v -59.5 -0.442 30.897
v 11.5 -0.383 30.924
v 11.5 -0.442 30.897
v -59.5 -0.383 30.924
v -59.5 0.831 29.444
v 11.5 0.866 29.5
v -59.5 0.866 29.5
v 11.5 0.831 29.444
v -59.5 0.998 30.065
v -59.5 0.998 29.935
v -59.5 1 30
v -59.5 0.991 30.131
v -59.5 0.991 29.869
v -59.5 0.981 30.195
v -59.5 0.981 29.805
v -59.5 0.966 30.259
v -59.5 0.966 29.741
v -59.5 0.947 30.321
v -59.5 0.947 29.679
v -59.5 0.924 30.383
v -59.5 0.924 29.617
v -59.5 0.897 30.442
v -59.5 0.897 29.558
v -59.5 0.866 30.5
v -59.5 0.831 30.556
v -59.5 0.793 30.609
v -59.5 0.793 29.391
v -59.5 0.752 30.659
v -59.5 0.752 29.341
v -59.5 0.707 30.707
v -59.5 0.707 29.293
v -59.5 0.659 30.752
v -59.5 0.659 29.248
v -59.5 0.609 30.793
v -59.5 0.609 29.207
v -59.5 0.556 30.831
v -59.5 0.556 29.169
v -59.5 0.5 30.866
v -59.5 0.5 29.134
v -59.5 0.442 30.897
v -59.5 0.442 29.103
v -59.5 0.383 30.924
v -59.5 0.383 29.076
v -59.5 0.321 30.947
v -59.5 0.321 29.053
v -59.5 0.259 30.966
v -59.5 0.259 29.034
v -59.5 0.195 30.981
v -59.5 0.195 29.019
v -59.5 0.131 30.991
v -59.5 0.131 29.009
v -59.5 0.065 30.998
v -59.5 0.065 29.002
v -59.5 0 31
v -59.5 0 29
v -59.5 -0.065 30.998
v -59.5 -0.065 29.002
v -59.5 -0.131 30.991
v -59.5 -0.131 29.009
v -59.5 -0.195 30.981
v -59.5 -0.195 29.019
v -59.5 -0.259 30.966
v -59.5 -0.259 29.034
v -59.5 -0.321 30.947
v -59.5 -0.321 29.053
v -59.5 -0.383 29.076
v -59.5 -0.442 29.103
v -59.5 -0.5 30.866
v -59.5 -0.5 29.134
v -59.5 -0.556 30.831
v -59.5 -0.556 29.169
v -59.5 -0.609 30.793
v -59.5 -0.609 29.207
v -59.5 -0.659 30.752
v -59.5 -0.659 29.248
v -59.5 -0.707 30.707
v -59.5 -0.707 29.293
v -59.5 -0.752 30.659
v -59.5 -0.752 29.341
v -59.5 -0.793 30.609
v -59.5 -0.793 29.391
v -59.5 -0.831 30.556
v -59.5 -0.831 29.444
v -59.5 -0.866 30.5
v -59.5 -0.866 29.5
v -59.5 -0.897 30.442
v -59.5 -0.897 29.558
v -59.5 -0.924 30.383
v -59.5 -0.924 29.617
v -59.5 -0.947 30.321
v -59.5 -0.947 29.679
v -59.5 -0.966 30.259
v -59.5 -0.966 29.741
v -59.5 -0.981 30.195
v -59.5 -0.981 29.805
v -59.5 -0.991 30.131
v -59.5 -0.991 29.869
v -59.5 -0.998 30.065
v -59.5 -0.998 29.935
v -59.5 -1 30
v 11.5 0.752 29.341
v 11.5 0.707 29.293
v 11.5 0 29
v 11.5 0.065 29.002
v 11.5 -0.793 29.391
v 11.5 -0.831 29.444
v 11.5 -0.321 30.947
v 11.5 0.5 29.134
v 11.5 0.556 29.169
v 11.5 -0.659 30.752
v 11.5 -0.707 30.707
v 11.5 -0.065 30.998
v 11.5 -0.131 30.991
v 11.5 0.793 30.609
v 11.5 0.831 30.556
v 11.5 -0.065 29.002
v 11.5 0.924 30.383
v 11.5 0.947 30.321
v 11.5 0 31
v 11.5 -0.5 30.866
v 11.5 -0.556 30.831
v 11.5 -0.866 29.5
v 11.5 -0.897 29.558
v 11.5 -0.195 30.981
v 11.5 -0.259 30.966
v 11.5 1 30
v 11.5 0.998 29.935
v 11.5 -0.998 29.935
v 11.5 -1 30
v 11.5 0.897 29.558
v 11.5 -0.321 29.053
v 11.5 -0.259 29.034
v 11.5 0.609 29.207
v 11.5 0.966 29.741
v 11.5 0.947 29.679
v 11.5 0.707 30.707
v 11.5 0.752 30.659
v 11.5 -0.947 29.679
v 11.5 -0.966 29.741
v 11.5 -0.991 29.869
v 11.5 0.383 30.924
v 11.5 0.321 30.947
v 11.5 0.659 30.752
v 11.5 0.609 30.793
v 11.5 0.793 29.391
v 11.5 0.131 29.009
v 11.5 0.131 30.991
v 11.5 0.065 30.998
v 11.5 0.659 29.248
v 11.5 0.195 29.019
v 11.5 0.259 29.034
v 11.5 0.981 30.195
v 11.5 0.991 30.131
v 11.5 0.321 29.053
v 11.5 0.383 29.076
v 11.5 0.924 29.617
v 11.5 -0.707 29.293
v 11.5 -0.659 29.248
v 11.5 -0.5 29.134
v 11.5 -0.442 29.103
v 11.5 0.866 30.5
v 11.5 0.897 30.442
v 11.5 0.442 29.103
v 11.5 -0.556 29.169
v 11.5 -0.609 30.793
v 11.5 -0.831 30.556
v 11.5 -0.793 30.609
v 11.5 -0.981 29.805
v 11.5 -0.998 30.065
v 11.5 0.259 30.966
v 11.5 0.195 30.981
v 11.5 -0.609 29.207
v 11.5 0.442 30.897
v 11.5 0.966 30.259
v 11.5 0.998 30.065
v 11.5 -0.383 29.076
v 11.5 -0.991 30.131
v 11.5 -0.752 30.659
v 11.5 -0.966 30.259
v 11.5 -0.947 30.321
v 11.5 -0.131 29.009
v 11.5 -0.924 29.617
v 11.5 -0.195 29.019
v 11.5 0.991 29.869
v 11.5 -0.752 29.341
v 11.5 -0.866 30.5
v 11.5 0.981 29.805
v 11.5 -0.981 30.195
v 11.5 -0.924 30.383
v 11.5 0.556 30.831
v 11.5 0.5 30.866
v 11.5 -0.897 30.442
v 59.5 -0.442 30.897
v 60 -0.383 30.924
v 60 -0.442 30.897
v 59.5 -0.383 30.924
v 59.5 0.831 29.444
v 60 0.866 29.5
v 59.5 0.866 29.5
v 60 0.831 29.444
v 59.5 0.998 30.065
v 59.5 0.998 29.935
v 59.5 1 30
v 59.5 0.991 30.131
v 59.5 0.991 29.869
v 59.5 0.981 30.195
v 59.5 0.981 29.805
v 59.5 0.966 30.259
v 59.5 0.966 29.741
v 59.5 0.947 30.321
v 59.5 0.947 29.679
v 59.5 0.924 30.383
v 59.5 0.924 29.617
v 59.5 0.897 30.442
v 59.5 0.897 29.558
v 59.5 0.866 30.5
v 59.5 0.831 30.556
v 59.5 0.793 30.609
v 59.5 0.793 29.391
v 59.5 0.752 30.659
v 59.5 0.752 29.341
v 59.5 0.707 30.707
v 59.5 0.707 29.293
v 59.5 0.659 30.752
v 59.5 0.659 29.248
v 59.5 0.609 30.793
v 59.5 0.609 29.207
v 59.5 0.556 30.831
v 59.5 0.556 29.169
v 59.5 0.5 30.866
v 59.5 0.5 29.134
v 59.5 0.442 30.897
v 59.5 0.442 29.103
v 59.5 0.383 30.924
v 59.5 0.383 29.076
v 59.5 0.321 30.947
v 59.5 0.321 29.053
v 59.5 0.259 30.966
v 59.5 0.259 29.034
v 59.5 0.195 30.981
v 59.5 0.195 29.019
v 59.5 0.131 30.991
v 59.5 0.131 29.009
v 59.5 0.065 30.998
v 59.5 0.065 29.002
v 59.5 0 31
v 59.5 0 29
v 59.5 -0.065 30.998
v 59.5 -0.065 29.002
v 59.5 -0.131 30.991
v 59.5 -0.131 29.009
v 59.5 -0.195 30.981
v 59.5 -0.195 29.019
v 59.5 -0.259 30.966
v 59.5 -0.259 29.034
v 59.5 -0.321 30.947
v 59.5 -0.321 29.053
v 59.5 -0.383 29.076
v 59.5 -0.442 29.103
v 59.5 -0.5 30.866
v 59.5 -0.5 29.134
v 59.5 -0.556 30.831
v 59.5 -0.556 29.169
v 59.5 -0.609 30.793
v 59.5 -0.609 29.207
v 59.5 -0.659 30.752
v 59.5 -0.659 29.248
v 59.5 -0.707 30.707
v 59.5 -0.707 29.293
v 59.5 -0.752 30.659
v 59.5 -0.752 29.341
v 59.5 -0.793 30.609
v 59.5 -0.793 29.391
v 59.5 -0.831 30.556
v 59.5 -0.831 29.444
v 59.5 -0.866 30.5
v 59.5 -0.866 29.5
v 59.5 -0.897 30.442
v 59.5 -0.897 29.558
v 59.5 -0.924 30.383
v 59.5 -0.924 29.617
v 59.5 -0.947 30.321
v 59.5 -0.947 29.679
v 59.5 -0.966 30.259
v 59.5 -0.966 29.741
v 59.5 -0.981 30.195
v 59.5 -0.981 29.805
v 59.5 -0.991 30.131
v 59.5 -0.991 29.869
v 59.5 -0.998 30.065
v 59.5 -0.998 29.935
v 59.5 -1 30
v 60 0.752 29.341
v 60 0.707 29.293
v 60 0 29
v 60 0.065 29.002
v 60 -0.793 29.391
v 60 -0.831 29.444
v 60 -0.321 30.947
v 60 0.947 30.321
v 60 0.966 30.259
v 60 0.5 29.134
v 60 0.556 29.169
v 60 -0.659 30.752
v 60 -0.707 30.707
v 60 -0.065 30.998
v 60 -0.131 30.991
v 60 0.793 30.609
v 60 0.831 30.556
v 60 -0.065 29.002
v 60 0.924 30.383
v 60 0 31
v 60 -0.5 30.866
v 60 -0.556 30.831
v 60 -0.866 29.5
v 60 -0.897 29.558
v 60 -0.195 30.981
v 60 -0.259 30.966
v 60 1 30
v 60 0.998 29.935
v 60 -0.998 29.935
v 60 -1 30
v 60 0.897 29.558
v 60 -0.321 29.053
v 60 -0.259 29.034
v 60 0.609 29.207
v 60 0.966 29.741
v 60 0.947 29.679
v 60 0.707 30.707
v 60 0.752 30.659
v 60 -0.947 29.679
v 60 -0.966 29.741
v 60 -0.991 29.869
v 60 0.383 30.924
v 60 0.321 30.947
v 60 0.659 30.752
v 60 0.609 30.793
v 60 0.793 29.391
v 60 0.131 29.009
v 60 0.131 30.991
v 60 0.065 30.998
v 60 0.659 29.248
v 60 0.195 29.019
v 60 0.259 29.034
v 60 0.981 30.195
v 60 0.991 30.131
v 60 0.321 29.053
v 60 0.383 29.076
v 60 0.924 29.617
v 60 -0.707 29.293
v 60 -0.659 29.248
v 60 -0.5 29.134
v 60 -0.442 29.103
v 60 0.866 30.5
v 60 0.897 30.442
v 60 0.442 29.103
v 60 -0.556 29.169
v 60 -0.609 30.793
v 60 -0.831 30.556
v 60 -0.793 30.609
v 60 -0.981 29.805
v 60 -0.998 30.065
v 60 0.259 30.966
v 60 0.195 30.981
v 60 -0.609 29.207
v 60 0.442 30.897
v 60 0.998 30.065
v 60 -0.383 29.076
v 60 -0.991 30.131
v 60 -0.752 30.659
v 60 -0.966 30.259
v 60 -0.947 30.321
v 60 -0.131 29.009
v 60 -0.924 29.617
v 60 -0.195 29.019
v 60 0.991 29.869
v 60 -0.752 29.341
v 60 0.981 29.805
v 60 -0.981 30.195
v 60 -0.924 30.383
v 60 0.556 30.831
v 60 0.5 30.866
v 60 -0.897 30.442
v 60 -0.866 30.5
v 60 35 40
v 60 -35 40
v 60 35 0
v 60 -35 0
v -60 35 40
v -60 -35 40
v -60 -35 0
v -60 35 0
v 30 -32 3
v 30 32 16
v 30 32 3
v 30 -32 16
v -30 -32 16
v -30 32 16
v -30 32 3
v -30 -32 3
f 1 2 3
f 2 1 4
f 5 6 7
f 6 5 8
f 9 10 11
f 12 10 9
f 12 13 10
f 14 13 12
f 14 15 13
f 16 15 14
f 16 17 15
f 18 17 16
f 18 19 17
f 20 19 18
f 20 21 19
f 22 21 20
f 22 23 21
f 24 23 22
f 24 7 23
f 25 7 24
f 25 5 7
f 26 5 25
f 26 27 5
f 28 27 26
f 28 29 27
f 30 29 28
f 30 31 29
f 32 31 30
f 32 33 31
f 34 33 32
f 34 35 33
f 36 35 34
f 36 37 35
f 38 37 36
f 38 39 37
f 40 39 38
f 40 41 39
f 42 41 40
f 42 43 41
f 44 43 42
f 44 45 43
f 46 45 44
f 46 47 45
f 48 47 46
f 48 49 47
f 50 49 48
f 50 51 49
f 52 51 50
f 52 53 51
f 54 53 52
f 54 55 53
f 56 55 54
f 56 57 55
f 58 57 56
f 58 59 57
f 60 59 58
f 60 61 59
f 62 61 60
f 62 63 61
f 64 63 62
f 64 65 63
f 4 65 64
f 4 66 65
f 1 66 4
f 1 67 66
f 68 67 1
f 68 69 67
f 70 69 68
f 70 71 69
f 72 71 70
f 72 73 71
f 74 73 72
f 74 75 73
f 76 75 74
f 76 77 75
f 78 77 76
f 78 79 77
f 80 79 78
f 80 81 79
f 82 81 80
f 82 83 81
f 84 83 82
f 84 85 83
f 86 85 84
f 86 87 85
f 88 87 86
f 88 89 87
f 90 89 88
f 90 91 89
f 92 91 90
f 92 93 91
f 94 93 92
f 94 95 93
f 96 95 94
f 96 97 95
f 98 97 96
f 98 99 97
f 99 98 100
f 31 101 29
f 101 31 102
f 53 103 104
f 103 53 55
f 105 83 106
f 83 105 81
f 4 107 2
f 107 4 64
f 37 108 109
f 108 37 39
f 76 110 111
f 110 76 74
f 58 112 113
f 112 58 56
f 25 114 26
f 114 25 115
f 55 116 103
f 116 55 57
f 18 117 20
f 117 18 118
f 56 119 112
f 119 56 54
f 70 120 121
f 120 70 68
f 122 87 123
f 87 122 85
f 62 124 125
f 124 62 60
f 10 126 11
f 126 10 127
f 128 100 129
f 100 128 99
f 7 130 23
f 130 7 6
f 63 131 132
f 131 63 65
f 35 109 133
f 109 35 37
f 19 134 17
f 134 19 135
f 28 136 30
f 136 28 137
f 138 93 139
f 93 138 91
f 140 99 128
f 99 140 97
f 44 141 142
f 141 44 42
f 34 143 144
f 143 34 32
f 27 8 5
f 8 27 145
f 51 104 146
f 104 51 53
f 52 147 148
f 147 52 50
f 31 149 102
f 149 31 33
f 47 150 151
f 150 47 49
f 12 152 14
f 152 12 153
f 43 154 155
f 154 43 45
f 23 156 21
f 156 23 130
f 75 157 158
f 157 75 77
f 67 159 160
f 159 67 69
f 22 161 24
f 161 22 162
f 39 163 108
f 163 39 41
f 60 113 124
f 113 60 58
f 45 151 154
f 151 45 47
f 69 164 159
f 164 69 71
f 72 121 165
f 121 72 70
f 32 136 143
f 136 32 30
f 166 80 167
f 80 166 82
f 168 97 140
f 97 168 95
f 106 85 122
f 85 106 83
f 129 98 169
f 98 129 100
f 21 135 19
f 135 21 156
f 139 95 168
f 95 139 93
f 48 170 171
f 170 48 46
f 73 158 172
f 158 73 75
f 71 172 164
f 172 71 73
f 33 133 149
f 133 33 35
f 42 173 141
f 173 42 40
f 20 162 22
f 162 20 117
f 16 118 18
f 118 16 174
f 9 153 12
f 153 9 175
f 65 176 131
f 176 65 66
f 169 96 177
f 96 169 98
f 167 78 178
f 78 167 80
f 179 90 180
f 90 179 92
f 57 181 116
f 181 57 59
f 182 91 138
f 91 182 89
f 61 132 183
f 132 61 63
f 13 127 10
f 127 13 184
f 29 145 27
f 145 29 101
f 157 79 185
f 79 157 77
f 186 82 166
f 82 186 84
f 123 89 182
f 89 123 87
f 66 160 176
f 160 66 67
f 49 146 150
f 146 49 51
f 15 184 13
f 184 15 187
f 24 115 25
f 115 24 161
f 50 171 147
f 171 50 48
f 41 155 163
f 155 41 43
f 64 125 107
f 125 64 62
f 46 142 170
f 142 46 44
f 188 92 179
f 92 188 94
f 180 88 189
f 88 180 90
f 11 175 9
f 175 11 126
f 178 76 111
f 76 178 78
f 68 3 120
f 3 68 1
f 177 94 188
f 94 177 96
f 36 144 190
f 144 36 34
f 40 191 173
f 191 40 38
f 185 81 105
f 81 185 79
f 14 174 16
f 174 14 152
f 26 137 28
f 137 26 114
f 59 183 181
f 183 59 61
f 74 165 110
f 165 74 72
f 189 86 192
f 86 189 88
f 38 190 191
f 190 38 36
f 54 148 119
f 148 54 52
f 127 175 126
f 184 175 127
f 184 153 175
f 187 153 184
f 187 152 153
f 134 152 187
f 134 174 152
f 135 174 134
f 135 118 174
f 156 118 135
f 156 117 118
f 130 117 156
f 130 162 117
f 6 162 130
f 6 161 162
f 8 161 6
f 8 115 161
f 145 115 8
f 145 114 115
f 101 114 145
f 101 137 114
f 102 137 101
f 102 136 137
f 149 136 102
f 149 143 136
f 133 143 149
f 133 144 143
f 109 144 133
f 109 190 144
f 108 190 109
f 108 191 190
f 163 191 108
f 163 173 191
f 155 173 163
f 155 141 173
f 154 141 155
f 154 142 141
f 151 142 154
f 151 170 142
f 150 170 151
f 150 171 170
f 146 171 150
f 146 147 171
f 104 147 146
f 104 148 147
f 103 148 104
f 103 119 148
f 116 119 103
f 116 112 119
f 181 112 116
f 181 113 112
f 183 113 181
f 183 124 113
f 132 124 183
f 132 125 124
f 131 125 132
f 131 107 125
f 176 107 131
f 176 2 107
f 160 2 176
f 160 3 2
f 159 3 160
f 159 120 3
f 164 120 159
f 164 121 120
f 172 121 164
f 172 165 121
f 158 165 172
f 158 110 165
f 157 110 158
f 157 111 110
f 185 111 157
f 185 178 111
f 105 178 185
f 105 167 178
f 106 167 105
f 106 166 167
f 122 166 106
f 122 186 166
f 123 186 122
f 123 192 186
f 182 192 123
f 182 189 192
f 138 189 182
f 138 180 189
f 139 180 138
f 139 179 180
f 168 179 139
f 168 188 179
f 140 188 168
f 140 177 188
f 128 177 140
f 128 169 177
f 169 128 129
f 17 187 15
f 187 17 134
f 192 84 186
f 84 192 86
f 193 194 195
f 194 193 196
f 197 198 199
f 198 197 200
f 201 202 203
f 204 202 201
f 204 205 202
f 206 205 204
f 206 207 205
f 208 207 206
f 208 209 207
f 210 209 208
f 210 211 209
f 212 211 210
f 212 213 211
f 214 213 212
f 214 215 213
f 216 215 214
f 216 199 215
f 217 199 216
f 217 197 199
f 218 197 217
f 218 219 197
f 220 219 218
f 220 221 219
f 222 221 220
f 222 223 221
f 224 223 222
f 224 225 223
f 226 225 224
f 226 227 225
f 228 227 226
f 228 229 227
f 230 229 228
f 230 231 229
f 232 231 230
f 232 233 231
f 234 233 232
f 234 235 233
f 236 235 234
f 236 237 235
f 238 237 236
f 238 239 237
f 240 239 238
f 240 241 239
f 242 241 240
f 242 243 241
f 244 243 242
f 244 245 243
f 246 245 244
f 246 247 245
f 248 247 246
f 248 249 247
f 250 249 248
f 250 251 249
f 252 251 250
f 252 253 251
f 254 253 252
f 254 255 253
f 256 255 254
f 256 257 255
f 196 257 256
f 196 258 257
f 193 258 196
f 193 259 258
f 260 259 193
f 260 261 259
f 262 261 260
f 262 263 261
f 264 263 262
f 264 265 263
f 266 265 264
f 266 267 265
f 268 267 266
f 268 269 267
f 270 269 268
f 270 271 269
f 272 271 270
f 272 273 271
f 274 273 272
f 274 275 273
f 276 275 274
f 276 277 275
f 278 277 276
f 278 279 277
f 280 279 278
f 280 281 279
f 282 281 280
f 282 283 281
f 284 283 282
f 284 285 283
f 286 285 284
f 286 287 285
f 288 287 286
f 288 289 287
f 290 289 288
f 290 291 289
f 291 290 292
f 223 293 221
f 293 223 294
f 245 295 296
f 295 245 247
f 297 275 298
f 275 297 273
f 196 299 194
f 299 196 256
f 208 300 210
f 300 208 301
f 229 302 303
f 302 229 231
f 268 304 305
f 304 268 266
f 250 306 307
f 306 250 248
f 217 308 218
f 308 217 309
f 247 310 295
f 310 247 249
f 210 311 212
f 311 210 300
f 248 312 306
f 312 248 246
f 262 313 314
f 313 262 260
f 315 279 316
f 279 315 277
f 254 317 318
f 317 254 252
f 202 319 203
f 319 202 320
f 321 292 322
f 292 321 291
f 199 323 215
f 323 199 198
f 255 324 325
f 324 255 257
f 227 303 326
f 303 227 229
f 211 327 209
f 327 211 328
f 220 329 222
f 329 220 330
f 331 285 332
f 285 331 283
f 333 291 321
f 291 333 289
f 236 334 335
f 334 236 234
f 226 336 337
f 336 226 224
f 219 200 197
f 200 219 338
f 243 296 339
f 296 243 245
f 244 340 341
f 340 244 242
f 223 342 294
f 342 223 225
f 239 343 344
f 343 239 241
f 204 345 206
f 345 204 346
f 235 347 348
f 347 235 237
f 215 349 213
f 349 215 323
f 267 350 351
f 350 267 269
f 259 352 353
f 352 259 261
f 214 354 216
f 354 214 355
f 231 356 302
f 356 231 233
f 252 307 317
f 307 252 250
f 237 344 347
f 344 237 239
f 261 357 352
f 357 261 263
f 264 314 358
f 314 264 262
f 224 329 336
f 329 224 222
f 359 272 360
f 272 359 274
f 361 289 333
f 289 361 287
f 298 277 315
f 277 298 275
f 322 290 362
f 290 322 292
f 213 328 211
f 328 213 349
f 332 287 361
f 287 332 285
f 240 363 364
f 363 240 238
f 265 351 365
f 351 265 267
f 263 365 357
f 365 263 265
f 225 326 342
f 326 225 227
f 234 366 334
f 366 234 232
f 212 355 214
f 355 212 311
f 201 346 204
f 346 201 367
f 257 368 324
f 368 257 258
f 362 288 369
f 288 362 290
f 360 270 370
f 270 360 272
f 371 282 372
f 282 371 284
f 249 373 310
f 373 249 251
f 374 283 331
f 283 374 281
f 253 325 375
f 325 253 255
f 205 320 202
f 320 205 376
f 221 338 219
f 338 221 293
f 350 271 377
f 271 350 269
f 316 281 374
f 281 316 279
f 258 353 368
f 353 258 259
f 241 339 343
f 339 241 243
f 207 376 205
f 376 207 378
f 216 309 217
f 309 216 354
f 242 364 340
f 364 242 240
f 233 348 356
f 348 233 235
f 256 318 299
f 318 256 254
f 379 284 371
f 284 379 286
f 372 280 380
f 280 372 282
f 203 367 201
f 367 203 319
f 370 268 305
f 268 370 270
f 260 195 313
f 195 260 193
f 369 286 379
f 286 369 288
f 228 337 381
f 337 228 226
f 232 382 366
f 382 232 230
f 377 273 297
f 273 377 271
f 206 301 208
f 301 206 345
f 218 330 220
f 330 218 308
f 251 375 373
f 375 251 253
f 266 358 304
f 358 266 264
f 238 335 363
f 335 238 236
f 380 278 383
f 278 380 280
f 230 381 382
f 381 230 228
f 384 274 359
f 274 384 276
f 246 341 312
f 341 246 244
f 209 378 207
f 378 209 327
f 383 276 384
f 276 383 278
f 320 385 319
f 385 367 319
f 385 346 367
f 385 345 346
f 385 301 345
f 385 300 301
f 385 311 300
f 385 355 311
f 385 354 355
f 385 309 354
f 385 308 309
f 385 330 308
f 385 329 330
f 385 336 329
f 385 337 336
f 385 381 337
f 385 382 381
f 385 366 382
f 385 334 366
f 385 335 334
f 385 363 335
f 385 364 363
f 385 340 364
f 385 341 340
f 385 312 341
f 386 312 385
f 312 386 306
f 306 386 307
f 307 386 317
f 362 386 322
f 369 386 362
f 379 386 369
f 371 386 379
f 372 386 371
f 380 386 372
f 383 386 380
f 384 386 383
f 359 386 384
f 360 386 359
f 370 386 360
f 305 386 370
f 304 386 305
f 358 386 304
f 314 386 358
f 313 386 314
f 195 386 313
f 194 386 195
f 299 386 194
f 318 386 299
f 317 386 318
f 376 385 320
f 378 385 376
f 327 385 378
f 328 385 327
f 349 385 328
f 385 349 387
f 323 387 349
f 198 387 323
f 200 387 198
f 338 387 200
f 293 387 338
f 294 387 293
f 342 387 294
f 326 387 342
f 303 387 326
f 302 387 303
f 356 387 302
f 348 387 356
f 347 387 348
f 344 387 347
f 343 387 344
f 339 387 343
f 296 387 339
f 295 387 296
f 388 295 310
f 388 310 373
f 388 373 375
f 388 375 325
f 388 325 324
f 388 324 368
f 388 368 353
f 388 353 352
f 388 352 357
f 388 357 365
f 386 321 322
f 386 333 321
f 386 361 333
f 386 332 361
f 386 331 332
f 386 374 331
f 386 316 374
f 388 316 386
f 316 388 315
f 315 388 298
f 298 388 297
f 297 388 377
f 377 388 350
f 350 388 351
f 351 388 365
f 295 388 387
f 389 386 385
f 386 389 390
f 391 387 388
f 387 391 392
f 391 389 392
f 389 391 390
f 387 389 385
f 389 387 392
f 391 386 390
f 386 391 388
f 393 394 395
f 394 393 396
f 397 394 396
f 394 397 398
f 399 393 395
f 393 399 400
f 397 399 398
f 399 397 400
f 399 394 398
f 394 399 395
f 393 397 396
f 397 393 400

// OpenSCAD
// Mini horizontal gel-electrophoresis box - buffer tank
// Print orientation: tank rests on XY plane at z = 0, builds upward (+Z)

// ---------------- Parameters ----------------
tank_x      = 120;   // outer length in X (mm)
tank_y      = 70;    // outer width in Y (mm)
tank_h      = 40;    // outer height in Z (mm)
wall        = 3;     // wall thickness (mm)
floor       = 3;     // floor thickness (mm)

platform_x  = 60;    // platform length in X (mm), centred
platform_y  = tank_y - 2 * wall;  // platform spans full inner width (mm)
platform_z  = 13;    // platform top height above inner floor (mm)

hole_d      = 2;     // electrode hole diameter (mm)
hole_y      = 0;     // hole centre Y (mm)
hole_z      = 30;    // hole centre Z (mm)

eps         = 0.5;   // cutter overshoot past faces (mm)
$fn         = 96;    // curve resolution

// ---------------- Derived ----------------
inner_h = tank_h - floor;              // 37 mm inner floor-to-top height
// Platform sits on the floor, so its bottom is at z = floor = 3

// ---------------- Model ----------------
difference() {
    // Tank body: open-top rectangular box with floor
    translate([-tank_x / 2, -tank_y / 2, 0])
        cube([tank_x, tank_y, tank_h]);

    // Gel-tray platform, centred in X, spanning full inner width
    translate([-platform_x / 2, -platform_y / 2, floor])
        cube([platform_x, platform_y, platform_z]);

    // Horizontal electrode holes through each end wall (at X = +/- 60)
    for (sx = [-1, 1])
        translate([sx * (tank_x / 2 - eps), hole_y, hole_z])
            rotate([0, 90, 0])
                cylinder(d = hole_d, h = tank_y + 2 * eps);
}
